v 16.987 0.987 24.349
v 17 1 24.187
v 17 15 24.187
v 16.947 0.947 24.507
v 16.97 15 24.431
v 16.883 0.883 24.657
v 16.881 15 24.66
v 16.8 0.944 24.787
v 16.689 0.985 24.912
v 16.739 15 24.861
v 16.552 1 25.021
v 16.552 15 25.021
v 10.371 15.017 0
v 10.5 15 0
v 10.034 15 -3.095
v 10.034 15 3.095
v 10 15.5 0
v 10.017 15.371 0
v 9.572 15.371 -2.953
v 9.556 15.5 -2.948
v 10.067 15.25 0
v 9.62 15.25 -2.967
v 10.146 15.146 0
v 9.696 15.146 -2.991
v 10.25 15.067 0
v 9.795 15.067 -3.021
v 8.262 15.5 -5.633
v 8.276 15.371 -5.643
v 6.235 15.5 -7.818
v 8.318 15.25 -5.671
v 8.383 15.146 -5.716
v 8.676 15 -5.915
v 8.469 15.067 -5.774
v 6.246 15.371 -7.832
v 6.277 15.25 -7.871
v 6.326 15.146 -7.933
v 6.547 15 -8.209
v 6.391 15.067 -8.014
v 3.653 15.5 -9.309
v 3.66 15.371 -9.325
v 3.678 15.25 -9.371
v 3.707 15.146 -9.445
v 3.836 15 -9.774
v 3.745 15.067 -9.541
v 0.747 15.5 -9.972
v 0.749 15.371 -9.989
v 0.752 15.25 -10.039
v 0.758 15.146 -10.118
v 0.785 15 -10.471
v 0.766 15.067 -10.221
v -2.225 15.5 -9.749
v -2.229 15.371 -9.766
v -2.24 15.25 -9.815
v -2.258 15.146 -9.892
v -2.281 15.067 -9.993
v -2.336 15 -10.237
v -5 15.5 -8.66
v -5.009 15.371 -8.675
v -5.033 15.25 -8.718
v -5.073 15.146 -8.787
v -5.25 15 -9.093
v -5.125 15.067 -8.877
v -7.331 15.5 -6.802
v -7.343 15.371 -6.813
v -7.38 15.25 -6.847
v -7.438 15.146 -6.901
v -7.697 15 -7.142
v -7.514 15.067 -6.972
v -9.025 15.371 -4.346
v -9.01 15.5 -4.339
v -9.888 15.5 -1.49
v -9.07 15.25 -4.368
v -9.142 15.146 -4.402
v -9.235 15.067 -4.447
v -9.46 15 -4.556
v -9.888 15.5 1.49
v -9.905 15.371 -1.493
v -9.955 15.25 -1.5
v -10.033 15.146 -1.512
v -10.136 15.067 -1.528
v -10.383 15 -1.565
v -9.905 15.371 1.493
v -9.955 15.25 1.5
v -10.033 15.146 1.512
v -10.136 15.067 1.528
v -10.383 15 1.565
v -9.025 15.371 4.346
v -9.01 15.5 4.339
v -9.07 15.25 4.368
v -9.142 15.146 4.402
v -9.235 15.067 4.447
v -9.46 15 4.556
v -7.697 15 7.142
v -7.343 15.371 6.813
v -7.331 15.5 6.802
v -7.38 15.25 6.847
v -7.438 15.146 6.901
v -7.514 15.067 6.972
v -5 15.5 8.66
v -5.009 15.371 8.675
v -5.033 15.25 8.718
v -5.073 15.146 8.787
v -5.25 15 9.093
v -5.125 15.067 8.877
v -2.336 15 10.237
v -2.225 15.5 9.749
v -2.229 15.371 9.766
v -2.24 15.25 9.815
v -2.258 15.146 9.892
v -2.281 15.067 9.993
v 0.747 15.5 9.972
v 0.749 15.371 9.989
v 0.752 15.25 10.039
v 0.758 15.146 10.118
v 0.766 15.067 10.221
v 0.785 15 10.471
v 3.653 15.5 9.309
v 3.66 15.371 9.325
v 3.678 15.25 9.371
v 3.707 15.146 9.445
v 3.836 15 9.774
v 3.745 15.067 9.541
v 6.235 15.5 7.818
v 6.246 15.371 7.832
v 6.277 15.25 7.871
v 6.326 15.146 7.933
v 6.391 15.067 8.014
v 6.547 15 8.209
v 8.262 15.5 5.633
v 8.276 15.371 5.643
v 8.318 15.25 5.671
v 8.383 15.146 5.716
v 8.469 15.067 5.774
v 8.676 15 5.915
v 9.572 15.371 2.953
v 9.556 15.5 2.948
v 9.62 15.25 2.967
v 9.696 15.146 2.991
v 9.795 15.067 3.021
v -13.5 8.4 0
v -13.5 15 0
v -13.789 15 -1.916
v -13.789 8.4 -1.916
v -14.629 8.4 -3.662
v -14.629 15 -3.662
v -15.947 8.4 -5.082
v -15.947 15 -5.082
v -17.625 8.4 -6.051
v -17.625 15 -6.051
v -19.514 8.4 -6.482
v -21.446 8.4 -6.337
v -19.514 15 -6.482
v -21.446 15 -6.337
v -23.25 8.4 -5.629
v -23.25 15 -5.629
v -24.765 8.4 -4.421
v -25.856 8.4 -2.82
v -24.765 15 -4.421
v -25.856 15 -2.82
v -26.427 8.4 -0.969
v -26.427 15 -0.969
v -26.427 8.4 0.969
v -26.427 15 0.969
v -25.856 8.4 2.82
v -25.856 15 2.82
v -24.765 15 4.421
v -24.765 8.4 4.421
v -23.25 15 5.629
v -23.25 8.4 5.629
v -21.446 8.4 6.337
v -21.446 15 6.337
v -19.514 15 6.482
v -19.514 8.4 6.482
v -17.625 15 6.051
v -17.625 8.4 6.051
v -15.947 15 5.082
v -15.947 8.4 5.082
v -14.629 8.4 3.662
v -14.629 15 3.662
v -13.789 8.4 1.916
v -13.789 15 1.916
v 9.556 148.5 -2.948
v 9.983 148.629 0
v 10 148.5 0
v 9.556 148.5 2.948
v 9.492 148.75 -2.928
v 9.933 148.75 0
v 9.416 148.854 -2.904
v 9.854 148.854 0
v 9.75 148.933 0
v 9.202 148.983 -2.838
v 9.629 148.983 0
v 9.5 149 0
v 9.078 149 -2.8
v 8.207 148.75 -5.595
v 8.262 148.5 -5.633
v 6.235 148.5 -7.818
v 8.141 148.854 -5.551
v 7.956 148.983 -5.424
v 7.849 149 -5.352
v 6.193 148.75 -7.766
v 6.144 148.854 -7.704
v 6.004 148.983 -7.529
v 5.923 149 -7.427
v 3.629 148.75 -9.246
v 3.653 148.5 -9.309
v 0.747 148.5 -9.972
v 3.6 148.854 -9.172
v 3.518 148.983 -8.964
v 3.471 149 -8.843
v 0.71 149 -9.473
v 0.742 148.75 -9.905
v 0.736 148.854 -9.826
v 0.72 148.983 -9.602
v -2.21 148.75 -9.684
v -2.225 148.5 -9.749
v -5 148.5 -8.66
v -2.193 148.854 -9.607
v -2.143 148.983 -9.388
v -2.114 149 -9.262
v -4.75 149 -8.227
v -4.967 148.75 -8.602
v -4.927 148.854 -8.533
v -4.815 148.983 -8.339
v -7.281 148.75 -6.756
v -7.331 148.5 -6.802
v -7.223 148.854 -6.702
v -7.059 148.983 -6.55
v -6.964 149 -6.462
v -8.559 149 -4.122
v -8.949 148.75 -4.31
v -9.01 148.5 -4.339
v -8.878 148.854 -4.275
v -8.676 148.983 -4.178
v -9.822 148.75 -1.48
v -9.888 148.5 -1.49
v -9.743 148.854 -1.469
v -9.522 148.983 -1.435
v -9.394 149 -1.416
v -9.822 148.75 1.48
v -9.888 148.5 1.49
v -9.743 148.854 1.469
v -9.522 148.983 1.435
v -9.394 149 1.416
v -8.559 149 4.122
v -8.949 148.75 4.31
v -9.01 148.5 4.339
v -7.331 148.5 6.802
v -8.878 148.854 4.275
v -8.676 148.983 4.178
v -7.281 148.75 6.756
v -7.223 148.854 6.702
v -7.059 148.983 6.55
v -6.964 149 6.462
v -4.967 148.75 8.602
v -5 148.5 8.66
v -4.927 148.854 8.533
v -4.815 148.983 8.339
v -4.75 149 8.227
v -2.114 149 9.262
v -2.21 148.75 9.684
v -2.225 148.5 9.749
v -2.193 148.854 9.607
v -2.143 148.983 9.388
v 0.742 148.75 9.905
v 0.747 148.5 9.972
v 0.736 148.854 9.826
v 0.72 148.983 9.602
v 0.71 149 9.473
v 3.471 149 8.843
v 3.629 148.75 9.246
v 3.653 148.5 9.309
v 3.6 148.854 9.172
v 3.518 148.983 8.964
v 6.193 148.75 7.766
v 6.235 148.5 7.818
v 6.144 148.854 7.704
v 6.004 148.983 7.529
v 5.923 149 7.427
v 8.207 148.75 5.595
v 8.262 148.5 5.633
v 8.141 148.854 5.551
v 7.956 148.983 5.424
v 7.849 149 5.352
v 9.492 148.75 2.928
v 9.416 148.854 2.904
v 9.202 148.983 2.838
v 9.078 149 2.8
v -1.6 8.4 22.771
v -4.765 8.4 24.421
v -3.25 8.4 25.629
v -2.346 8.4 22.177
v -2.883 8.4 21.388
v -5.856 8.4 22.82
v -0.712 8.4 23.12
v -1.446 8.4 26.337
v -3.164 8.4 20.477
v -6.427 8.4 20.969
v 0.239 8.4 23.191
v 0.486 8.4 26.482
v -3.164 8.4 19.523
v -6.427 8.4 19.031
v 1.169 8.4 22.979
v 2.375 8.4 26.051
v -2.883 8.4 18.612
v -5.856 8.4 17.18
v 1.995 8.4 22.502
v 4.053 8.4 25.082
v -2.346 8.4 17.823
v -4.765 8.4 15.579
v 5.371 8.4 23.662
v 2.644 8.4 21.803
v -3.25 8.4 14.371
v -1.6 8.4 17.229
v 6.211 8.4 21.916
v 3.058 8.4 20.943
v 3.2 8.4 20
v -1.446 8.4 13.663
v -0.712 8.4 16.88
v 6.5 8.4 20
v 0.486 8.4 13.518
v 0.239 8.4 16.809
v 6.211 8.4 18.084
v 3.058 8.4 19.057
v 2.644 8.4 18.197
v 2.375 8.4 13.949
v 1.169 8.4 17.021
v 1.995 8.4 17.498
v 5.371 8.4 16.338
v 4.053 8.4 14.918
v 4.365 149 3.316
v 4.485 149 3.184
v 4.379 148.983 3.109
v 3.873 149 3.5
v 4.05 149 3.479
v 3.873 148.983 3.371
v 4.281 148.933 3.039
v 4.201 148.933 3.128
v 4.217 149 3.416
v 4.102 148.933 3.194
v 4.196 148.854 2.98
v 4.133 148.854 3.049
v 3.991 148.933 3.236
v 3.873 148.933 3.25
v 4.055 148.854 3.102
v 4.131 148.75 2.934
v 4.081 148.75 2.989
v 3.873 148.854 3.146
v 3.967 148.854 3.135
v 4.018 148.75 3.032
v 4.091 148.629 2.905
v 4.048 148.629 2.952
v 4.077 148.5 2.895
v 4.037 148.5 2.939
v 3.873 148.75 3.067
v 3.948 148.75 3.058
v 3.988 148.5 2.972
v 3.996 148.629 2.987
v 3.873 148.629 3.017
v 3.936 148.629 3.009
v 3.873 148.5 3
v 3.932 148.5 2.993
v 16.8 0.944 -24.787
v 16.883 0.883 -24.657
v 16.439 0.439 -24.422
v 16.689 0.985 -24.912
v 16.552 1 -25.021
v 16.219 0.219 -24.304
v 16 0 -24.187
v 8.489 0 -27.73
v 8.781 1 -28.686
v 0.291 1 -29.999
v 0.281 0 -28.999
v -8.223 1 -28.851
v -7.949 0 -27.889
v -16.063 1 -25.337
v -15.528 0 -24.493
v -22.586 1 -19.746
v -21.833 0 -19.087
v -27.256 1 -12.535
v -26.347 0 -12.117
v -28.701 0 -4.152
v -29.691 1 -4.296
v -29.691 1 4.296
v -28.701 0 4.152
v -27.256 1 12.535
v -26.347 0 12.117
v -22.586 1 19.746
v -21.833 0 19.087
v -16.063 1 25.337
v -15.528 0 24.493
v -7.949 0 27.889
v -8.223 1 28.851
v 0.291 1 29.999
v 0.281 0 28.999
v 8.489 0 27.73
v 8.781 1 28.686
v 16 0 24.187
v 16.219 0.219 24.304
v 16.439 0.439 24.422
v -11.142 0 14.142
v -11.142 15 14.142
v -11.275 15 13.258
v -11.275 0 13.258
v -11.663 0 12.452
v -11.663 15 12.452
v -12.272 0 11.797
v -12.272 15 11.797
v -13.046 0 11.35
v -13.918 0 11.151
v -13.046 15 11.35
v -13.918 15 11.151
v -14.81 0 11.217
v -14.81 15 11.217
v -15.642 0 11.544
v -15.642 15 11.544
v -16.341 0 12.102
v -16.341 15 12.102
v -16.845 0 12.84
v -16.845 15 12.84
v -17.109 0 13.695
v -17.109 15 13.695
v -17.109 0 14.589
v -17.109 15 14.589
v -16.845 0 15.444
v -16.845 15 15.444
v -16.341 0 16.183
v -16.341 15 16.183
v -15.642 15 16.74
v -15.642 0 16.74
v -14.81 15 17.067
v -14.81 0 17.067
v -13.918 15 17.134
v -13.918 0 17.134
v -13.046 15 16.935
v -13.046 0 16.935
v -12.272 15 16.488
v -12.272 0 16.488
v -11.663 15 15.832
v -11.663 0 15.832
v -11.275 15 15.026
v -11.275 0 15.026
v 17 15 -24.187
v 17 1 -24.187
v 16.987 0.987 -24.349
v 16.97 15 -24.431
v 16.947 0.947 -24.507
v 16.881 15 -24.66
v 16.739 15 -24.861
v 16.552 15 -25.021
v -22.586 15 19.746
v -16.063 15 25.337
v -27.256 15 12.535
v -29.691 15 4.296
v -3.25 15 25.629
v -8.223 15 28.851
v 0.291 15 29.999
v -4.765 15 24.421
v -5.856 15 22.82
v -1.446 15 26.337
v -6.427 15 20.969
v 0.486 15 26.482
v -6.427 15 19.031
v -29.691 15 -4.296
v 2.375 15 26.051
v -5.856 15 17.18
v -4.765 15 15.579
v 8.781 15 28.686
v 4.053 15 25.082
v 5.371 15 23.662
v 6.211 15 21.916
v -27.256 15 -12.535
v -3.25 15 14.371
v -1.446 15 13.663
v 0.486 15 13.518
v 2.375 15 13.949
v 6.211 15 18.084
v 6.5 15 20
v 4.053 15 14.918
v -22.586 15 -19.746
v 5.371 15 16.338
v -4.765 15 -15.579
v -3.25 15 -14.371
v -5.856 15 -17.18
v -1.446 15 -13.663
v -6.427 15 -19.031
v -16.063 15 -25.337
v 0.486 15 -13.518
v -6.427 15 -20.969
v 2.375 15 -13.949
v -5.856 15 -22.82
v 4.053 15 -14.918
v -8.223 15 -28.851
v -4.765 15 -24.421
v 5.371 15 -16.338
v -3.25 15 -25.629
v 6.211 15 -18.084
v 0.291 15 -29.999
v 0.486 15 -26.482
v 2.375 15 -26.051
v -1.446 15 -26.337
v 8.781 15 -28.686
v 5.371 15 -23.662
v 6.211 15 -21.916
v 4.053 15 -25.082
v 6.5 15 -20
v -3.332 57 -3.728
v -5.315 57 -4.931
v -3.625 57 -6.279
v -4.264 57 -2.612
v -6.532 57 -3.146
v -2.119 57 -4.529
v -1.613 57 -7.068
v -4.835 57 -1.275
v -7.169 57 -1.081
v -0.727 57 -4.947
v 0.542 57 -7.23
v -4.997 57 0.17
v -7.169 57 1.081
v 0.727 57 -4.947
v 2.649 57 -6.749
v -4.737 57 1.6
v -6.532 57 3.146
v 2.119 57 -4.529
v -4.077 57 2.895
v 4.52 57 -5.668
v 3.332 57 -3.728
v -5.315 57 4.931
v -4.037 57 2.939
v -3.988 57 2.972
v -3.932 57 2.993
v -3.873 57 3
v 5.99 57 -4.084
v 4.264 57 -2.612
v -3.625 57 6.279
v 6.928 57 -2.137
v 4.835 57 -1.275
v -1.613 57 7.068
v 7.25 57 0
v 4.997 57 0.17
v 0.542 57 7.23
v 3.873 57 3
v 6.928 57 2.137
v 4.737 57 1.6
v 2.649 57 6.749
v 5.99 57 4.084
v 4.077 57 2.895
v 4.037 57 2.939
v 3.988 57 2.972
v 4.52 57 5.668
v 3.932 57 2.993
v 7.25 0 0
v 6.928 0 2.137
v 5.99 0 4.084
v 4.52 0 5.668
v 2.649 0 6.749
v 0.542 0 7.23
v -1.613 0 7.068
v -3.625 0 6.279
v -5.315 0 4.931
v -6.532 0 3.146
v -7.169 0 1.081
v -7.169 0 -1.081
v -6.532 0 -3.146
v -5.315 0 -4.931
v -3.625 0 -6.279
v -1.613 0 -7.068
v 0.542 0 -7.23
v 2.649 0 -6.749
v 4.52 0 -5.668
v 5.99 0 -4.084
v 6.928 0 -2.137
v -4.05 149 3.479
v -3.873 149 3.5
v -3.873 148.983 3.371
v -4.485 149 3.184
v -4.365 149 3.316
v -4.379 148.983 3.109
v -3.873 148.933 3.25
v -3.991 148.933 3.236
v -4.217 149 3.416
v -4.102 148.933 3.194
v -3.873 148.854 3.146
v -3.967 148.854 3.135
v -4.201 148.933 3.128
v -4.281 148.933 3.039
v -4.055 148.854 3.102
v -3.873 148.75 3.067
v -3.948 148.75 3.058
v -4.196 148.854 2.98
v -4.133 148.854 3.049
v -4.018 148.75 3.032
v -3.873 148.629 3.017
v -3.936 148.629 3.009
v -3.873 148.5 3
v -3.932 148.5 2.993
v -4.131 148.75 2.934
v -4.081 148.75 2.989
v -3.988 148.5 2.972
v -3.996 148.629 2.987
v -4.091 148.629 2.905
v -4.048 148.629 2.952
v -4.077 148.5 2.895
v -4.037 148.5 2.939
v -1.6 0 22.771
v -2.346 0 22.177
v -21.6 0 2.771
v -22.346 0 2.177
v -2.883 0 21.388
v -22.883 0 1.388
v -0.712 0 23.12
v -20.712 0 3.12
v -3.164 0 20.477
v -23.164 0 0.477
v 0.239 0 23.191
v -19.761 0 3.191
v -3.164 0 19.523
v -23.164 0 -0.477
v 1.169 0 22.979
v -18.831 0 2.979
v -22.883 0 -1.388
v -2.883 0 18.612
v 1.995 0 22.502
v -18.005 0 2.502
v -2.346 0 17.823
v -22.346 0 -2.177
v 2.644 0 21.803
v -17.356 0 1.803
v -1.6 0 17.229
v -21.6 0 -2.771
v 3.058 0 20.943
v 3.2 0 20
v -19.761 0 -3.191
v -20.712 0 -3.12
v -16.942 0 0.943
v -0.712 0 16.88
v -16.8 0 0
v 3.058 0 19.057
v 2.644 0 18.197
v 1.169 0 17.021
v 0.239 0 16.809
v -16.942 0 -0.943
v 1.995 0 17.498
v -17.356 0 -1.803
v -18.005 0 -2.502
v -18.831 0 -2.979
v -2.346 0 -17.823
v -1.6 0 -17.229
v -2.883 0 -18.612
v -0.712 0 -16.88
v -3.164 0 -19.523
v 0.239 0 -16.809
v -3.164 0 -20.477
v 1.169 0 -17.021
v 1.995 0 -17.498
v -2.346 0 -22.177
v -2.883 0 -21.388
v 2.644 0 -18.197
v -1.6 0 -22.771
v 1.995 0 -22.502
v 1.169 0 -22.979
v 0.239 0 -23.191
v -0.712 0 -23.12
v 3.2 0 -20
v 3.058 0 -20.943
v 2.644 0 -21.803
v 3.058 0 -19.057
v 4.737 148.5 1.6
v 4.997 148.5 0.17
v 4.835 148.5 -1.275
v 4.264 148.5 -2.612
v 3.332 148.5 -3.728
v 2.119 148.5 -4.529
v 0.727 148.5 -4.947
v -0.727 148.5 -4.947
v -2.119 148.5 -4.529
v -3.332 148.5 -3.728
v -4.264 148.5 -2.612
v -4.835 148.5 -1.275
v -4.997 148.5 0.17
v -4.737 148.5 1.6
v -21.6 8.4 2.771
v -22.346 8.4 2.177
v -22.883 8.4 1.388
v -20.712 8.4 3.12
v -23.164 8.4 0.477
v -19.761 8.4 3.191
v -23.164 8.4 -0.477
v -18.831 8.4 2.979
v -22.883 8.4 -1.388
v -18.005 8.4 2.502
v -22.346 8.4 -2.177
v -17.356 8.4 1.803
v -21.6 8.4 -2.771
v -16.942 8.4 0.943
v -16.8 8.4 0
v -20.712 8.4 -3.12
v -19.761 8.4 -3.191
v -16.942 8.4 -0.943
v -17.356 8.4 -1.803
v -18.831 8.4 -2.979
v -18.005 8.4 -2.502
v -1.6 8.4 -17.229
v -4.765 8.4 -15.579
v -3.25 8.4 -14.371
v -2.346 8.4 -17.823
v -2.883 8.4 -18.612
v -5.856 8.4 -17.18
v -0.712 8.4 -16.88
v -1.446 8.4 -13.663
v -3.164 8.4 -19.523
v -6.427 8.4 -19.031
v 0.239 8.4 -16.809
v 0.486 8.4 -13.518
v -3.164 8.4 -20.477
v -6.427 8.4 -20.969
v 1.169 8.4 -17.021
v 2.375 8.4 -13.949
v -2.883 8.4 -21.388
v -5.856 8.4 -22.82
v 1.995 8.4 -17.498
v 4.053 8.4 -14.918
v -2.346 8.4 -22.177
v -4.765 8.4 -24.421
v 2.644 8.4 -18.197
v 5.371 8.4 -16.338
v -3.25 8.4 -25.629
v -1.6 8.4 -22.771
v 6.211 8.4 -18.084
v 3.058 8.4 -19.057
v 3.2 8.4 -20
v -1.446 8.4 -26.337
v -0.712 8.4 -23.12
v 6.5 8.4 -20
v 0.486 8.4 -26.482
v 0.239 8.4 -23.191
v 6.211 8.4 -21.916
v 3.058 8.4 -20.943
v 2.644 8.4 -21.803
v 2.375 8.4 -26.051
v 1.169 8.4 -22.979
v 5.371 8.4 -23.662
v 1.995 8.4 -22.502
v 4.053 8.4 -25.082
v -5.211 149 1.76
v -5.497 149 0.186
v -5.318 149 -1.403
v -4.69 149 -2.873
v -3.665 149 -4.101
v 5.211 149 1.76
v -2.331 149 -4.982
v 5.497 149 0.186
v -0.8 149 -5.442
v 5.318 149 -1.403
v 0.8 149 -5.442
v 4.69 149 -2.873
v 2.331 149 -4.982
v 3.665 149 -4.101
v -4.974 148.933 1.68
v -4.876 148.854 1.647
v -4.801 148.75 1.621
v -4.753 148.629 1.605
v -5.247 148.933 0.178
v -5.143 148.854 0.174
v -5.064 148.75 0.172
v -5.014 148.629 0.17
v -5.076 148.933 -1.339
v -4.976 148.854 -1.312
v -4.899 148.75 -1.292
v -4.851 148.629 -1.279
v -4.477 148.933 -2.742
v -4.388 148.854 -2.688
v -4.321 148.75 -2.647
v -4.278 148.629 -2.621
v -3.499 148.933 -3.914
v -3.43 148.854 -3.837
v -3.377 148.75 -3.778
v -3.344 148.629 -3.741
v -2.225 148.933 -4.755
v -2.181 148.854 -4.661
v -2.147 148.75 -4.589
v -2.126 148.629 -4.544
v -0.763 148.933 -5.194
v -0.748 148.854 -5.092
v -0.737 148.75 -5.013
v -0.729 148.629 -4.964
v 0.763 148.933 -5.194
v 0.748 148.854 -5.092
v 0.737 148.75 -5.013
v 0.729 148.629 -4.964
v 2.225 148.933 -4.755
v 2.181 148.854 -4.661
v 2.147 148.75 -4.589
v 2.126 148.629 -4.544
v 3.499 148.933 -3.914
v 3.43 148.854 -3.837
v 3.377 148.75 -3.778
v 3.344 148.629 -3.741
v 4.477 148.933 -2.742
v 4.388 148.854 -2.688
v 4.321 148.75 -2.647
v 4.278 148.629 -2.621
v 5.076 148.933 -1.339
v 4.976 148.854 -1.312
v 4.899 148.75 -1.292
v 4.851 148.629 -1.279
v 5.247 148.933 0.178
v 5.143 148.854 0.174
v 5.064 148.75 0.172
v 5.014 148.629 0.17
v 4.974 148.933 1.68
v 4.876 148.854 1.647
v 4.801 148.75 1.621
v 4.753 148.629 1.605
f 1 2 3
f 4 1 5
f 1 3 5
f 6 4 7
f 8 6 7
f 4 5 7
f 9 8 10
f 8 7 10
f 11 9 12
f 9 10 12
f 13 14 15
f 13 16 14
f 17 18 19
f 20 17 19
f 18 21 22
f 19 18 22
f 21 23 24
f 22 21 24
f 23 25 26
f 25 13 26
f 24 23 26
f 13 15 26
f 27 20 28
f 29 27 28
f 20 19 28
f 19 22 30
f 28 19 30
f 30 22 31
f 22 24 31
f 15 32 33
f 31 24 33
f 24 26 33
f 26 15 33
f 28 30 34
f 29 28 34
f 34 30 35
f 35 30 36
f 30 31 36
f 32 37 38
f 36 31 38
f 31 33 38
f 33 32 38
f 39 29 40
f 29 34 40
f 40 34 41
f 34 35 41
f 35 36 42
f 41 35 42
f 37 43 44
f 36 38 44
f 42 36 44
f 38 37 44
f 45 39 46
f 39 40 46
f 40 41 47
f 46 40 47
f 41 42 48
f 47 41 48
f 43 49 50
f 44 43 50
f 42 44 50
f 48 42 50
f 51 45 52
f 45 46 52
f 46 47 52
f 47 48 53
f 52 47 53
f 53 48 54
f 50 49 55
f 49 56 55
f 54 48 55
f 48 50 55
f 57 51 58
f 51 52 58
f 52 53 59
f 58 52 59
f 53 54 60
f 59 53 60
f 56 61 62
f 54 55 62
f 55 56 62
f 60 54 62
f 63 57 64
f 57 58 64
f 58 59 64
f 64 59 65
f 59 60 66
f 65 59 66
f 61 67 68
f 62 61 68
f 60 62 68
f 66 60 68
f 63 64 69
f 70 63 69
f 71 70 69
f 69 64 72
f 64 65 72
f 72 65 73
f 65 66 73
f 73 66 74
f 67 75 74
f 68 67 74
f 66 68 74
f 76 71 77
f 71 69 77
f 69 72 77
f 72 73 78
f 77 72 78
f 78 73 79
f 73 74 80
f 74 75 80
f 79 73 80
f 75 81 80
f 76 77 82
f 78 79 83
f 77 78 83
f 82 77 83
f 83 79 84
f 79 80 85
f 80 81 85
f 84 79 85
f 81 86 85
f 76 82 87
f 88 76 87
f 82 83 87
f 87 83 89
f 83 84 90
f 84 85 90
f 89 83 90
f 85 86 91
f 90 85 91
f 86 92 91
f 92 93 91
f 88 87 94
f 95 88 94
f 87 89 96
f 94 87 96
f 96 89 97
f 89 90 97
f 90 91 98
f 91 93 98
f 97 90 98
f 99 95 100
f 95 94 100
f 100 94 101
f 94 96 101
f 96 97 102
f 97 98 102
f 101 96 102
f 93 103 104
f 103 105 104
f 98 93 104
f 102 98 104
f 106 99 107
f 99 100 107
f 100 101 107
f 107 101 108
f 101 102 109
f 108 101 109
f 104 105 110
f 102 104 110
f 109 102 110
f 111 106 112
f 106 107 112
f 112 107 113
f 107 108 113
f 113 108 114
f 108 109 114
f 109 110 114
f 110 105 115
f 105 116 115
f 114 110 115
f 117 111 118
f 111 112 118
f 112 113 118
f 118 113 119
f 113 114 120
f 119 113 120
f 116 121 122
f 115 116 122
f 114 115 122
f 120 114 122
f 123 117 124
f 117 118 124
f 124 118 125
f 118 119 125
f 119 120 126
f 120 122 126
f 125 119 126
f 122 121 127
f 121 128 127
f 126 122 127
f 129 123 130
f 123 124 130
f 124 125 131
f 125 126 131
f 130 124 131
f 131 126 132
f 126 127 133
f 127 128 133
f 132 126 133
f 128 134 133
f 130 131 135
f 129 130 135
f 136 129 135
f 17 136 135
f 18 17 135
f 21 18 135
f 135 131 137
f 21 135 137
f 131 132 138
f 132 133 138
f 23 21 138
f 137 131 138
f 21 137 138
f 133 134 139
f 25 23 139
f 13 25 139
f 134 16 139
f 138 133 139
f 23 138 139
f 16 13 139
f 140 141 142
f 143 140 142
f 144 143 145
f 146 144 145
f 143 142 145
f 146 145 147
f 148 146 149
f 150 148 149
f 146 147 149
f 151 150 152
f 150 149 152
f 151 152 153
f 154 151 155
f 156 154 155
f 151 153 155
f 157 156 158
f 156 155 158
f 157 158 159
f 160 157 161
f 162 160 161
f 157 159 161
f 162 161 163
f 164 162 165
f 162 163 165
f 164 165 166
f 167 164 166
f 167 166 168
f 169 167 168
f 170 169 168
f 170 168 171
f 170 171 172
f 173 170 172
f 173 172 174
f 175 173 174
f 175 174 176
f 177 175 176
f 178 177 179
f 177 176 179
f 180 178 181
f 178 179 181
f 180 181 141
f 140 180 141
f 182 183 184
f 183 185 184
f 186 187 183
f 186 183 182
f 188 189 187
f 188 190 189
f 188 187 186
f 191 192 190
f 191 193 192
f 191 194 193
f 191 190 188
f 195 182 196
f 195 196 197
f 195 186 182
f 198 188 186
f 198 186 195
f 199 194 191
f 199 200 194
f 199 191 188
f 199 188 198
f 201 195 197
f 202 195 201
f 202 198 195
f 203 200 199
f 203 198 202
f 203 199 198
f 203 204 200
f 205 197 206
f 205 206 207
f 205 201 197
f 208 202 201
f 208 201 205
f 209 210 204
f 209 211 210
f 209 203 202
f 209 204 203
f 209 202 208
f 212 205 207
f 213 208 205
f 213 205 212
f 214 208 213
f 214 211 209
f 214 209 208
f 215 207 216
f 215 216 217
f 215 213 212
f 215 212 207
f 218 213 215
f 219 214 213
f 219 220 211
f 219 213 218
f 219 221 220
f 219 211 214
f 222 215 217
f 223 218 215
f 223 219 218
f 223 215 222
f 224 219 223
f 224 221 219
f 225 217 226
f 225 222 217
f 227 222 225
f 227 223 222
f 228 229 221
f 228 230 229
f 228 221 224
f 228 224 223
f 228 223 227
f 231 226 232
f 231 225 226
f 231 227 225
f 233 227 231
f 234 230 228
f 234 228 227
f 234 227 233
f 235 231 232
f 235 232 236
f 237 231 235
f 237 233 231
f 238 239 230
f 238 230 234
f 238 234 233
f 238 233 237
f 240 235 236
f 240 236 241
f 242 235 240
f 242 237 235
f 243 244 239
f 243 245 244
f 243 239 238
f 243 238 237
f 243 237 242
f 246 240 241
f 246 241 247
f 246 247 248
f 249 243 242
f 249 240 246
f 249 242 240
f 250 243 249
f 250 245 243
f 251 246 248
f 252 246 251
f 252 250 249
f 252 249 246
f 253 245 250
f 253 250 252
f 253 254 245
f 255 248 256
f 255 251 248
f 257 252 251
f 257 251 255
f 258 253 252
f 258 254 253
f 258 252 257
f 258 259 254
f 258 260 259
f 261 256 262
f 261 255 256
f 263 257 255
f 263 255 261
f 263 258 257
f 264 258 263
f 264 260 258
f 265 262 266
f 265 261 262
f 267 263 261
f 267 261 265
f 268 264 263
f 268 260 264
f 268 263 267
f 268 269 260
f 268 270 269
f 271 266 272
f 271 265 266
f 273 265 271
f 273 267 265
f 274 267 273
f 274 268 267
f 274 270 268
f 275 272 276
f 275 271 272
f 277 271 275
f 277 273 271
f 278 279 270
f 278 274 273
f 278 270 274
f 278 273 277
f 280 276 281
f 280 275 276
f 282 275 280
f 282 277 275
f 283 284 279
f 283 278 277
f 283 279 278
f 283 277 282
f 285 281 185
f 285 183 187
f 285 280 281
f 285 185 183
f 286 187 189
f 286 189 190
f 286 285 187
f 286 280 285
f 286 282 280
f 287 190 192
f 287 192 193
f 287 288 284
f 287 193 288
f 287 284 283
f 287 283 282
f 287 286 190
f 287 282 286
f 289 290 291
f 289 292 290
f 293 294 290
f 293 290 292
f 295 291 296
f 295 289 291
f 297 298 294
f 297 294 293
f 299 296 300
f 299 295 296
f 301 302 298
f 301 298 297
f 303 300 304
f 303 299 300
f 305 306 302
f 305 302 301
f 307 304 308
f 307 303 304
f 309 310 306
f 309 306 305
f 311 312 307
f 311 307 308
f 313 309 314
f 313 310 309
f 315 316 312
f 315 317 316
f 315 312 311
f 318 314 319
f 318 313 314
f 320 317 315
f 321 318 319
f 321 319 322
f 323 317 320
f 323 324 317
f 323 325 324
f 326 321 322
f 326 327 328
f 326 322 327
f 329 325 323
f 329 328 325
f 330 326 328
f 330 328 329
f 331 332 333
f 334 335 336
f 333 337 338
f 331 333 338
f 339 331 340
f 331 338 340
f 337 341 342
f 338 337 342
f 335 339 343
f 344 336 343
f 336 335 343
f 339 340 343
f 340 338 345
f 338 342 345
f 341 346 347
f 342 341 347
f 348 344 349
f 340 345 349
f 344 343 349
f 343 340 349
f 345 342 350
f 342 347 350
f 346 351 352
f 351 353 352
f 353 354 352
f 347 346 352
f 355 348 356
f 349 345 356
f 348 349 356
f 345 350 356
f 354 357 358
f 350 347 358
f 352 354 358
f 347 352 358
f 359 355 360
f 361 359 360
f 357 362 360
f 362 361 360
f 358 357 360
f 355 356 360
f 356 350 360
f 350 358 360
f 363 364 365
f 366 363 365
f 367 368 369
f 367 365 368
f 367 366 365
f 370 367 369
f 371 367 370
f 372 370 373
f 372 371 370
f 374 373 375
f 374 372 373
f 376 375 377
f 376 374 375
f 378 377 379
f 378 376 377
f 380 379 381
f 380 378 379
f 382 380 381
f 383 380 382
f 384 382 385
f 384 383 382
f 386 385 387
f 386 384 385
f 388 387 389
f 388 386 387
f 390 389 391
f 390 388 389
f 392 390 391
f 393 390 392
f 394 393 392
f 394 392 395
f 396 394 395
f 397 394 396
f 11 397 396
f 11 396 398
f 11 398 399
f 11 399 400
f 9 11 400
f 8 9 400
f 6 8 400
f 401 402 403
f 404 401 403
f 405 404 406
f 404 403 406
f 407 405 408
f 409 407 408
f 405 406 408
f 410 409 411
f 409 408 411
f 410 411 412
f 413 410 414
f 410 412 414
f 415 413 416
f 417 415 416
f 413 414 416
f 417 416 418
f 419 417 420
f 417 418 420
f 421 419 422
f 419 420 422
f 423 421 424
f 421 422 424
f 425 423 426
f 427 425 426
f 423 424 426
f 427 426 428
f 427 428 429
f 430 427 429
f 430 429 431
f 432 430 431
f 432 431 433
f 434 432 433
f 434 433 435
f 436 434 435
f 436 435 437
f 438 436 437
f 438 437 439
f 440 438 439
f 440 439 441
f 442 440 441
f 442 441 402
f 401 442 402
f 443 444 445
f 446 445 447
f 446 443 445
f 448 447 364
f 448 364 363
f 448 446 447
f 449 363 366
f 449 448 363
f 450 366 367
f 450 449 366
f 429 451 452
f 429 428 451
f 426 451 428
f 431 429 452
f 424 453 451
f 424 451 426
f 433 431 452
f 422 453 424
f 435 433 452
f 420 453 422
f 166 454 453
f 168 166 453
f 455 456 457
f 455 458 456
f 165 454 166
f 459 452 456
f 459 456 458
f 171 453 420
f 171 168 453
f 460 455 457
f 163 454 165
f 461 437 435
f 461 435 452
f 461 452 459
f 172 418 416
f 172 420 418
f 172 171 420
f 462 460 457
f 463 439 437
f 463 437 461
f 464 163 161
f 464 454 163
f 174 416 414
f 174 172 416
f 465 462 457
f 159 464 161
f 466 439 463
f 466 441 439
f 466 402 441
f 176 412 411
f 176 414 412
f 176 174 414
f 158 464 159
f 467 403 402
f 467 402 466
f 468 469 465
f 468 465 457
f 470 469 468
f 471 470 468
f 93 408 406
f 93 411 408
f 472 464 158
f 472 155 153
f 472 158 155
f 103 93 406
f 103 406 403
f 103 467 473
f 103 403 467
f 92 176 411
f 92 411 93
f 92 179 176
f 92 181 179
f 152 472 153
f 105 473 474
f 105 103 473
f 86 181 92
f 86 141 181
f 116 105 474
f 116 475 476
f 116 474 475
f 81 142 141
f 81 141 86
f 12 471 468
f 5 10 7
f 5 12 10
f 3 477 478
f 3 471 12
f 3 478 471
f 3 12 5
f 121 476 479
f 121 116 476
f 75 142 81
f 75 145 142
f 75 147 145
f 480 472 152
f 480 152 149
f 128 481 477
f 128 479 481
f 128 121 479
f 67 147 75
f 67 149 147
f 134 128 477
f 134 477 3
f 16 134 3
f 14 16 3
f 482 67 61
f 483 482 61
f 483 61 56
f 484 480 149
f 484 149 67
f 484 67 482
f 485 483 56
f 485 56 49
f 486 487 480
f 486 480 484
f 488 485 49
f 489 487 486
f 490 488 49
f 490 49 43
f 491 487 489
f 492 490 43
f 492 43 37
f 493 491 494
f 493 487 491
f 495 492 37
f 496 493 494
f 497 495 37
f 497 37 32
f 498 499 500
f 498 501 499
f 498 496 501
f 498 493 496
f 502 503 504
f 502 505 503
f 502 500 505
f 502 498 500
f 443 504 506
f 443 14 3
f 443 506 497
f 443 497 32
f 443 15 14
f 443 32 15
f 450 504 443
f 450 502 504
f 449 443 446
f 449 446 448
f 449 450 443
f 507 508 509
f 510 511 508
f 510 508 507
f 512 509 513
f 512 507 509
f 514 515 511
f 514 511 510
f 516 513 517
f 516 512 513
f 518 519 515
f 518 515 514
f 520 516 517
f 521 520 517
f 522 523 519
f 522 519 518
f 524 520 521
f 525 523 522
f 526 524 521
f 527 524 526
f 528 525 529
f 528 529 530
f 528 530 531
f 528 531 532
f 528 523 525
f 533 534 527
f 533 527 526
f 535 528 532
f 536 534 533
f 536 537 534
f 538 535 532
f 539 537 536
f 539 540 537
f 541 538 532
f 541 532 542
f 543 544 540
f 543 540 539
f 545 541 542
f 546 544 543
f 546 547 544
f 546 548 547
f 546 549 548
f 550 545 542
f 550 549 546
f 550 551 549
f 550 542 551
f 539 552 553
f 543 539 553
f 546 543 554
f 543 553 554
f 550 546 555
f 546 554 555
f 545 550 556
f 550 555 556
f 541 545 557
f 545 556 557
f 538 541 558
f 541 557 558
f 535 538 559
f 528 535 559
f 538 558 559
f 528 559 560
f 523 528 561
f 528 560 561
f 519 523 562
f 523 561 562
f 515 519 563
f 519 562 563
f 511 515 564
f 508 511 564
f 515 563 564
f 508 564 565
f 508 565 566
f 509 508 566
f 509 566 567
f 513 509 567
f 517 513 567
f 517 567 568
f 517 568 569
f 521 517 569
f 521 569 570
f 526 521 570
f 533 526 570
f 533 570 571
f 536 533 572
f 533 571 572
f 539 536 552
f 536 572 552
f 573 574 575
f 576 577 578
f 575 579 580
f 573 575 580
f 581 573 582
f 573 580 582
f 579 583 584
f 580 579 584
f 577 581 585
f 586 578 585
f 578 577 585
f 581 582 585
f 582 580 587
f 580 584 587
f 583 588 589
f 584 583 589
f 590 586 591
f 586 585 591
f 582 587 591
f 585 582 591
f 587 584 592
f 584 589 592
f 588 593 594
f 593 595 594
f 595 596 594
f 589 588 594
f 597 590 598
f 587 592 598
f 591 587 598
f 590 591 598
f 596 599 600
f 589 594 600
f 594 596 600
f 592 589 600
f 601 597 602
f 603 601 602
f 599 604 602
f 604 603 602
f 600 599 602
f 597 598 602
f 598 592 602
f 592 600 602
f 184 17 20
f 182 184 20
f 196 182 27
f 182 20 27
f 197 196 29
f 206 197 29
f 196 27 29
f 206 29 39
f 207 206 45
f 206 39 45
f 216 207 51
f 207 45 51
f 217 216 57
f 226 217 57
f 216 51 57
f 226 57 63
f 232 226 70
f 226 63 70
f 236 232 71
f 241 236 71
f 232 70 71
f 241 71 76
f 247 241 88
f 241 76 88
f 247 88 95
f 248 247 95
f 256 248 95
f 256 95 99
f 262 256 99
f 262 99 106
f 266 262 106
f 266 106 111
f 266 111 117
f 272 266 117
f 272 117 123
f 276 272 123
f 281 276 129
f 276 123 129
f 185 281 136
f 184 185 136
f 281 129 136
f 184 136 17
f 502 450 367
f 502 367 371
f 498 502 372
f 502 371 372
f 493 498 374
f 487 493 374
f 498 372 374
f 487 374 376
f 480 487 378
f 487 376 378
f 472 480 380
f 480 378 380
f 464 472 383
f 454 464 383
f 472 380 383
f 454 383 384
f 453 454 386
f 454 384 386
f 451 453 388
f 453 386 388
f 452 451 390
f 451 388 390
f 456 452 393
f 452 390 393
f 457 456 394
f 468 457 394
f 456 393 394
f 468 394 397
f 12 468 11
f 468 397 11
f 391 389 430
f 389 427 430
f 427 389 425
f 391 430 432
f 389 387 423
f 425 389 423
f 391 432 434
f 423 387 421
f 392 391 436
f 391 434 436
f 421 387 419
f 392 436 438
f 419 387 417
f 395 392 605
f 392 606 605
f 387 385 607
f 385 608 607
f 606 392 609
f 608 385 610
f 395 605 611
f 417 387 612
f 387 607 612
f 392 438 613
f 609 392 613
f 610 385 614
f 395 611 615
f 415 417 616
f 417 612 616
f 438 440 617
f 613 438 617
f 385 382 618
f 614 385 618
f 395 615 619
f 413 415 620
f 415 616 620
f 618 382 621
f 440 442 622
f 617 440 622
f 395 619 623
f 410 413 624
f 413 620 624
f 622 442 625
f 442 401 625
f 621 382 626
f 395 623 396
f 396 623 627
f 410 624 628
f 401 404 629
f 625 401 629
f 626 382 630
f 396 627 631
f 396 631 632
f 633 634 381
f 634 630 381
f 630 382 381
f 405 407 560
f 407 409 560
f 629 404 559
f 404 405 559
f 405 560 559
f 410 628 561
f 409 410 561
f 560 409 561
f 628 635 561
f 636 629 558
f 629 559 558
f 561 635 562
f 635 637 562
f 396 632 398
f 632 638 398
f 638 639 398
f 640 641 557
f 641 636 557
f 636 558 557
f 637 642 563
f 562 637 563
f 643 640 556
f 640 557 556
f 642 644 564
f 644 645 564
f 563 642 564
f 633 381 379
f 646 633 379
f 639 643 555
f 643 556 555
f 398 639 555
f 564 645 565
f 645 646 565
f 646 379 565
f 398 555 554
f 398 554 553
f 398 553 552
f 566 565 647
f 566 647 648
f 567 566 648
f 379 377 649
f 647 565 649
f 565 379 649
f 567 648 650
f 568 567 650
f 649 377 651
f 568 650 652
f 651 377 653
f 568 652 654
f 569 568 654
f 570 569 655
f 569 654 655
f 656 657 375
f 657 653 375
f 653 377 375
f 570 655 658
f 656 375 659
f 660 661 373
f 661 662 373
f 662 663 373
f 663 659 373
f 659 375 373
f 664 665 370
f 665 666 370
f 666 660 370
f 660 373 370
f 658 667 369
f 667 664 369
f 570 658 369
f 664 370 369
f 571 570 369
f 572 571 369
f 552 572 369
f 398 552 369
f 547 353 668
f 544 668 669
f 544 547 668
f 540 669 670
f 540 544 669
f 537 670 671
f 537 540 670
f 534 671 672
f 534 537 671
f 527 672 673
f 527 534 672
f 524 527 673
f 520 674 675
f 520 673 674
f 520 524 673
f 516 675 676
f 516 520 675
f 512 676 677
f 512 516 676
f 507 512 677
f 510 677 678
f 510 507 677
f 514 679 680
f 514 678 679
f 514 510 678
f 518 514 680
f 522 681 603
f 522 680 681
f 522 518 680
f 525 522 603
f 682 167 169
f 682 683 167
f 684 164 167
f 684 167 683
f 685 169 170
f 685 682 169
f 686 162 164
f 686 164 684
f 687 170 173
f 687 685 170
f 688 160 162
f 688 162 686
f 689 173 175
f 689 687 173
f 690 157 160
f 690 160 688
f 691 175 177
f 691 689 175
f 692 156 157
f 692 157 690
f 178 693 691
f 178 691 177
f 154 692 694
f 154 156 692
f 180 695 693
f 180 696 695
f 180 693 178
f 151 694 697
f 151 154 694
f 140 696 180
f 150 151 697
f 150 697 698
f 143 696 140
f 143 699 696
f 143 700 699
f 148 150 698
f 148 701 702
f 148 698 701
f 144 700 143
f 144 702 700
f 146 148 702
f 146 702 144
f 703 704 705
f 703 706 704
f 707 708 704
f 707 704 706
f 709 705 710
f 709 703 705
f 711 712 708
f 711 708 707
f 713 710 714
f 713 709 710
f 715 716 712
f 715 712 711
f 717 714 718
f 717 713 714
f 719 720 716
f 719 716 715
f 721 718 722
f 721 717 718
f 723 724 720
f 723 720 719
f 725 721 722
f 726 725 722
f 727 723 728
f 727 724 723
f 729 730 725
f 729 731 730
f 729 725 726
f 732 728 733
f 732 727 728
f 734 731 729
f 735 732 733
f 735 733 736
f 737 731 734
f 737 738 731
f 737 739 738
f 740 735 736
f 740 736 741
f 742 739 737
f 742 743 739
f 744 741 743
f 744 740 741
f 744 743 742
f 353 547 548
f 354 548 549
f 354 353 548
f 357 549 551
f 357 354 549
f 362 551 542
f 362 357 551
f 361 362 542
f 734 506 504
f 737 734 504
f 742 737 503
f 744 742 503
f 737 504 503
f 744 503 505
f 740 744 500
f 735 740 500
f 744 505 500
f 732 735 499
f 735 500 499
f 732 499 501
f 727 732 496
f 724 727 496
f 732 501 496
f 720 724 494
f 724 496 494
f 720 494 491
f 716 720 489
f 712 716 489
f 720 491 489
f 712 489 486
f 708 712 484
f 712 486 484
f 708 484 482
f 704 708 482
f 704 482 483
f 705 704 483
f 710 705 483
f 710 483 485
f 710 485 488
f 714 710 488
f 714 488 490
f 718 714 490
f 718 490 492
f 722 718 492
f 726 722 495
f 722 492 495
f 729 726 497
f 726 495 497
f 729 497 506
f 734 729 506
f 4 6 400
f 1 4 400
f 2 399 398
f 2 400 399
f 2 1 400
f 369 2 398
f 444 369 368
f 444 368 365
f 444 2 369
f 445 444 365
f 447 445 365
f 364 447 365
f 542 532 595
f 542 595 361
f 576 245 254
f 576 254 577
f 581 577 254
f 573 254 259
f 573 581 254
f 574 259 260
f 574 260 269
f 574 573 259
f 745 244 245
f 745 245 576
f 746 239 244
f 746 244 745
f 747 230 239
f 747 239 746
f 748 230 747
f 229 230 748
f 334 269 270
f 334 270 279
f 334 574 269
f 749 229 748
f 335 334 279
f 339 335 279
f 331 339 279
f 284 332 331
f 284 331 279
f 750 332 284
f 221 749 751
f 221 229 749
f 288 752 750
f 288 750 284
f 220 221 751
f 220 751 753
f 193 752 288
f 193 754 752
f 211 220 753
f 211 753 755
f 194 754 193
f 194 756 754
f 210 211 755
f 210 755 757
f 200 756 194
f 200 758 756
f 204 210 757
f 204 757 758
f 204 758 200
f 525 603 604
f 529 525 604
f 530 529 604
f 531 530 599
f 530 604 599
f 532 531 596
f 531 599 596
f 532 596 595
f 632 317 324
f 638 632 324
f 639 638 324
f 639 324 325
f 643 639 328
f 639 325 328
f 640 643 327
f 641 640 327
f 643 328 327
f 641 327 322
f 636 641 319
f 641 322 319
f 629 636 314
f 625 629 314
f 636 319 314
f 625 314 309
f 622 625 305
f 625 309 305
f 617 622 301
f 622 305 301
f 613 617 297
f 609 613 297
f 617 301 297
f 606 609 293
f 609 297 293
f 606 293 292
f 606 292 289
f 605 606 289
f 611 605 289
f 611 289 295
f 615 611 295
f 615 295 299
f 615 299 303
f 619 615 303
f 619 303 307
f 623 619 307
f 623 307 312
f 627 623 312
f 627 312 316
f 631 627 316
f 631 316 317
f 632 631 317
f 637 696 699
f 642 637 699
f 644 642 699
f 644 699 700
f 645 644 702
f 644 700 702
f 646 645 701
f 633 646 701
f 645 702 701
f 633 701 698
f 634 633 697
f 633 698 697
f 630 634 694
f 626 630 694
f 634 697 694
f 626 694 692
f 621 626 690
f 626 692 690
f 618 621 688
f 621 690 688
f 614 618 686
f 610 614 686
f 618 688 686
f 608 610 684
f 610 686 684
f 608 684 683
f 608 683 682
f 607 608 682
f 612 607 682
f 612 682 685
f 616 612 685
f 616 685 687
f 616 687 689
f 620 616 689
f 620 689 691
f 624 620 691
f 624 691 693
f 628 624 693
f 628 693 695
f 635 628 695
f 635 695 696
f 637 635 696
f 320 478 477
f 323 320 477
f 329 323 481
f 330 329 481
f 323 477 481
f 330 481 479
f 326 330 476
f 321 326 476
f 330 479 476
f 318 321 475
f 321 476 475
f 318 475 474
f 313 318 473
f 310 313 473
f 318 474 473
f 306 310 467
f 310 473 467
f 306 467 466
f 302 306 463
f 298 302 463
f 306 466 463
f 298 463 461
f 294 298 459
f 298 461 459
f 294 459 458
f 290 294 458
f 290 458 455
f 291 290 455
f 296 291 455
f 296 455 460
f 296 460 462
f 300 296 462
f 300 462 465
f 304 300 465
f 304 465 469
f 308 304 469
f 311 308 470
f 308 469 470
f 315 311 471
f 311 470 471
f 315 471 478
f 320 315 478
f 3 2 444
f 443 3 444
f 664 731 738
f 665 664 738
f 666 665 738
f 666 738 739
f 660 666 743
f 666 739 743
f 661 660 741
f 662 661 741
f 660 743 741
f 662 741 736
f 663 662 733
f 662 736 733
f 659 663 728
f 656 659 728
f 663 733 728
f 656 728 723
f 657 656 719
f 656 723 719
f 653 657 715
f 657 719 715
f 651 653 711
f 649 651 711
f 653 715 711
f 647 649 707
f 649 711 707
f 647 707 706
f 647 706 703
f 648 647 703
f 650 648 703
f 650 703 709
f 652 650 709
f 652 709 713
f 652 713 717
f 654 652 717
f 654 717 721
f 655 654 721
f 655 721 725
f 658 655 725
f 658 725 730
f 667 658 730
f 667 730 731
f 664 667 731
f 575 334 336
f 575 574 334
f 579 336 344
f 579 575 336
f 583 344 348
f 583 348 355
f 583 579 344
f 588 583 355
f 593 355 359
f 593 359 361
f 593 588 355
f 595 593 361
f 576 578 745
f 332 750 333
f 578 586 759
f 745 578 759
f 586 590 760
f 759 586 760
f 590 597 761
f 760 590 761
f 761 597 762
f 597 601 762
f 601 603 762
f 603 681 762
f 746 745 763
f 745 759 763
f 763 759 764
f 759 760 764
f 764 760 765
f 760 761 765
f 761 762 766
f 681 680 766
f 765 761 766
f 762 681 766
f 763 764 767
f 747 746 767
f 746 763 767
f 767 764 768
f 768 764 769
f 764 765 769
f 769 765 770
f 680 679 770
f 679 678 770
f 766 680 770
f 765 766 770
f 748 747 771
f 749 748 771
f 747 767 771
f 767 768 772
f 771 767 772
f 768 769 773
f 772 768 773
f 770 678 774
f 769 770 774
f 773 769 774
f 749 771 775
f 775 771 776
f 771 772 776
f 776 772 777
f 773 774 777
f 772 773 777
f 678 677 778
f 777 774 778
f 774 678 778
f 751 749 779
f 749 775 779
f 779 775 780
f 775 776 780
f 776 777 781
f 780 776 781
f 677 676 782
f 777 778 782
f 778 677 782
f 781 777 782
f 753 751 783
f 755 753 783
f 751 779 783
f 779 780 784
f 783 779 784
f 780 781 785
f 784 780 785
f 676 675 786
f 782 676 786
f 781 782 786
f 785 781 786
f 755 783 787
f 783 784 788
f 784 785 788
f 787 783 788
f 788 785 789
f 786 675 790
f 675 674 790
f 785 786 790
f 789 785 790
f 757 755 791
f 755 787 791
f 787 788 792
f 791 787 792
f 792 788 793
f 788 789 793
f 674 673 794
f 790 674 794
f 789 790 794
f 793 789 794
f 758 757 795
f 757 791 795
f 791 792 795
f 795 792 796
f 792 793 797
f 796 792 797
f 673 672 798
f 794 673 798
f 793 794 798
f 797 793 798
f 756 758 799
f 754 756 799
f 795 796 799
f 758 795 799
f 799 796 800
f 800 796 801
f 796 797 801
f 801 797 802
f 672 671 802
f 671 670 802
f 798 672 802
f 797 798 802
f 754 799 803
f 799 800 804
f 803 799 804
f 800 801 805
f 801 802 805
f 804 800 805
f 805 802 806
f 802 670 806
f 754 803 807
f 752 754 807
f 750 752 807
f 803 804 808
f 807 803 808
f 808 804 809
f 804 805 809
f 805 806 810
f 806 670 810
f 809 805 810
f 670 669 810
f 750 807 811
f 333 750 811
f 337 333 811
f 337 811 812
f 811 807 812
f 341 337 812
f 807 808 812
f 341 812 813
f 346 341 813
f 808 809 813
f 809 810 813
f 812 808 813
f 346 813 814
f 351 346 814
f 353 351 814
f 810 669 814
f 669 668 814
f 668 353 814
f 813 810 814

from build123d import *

# Parameters (mm, degrees)
BOSS_EXTRUDE1_DEPTH = 15
SKETCH2_R           = 10
BOSS_EXTRUDE2_DEPTH = 134
SKETCH4_R           = 7.25
CUT_EXTRUDE1_DEPTH  = 57
CUT_EXTRUDE2_DEPTH  = 93
SKETCH7_R           = 6.5
CUT_EXTRUDE3_DEPTH  = 6.6
SKETCH8_R           = 3.2
CUT_EXTRUDE4_DEPTH  = 9.4
FILLET1_R           = 0.25
CHAMFER1_SIZE       = 1
FILLET2_R           = 0.5
FILLET3_R           = 0.5
FILLET4_R           = 0.5
SKETCH9_R           = 3
CUT_EXTRUDE5_DEPTH  = 16
FILLET5_R           = 1


with BuildPart() as part:
    # Sketch1 → Boss-Extrude1 (new body)
    with BuildSketch(Plane(origin=(0, 0, 0), x_dir=(1, 0, 0), z_dir=(0, 1, 0))):
        with BuildLine():
            Line((17, -24.718414189), (17, 24.718414189))
            ThreePointArc((17, 24.718414189), (-30, 0), (17, -24.718414189))
        make_face()
    extrude(amount=BOSS_EXTRUDE1_DEPTH)

    # Sketch2 → Boss-Extrude2 (add)
    with BuildSketch(Plane(origin=(0, 15, 0), x_dir=(1, 0, 0), z_dir=(0, 1, 0))):
        Circle(SKETCH2_R)
    extrude(amount=BOSS_EXTRUDE2_DEPTH)

    # Sketch4 → Cut-Extrude1 (cut)
    with BuildSketch(Plane.XZ):
        Circle(SKETCH4_R)
    extrude(amount=-CUT_EXTRUDE1_DEPTH, mode=Mode.SUBTRACT)

    # Sketch5 → Cut-Extrude2 (cut, through all)
    with BuildSketch(Plane.XZ.offset(-57)):
        with BuildLine():
            Line((-4, 3), (4, 3))
            ThreePointArc((4, 3), (0, -5), (-4, 3))
        make_face()
    extrude(amount=-CUT_EXTRUDE2_DEPTH, mode=Mode.SUBTRACT)

    # Sketch7 → Cut-Extrude3 (cut)
    with BuildSketch(Plane(origin=(0, 15, 0), x_dir=(1, 0, 0), z_dir=(0, 1, 0))):
        with Locations((0, -20)):
            Circle(SKETCH7_R)
        with Locations((-20, 0)):
            Circle(SKETCH7_R)
        with Locations((0, 20)):
            Circle(SKETCH7_R)
    extrude(amount=-CUT_EXTRUDE3_DEPTH, mode=Mode.SUBTRACT)

    # Sketch8 → Cut-Extrude4 (cut, through all)
    with BuildSketch(Plane(origin=(0, 8.4, 0), x_dir=(1, 0, 0), z_dir=(0, 1, 0))):
        with Locations((0, -20)):
            Circle(SKETCH8_R)
        with Locations((-20, 0)):
            Circle(SKETCH8_R)
        with Locations((0, 20)):
            Circle(SKETCH8_R)
    extrude(amount=-CUT_EXTRUDE4_DEPTH, mode=Mode.SUBTRACT)

    # Fillet1
    fillet1_edges = [part.edges().sort_by_distance(p)[0] for p in [
        (4, 103, 3),
        (-4, 103, 3),
    ]]
    fillet(fillet1_edges, radius=FILLET1_R)

    # Chamfer1
    chamfer1_edges = [part.edges().sort_by_distance(p)[0] for p in [
        (17, 0, 0),
        (-30, 0, 0),
    ]]
    chamfer(chamfer1_edges, length=CHAMFER1_SIZE)

    # Fillet2
    fillet2_edges = [part.edges().sort_by_distance(p)[0] for p in [
        (-10, 149, 0),
    ]]
    fillet(fillet2_edges, radius=FILLET2_R)

    # Fillet3
    fillet3_edges = [part.edges().sort_by_distance(p)[0] for p in [
        (0, 149, 3),
        (0, 149, -5),
        (3.987691213, 149, 2.972130829),
        (-3.987691213, 149, 2.972130829),
    ]]
    fillet(fillet3_edges, radius=FILLET3_R)

    # Fillet4
    fillet4_edges = [part.edges().sort_by_distance(p)[0] for p in [
        (-10, 15, 0),
    ]]
    fillet(fillet4_edges, radius=FILLET4_R)

    # Sketch9 → Cut-Extrude5 (cut, through all)
    with BuildSketch(Plane(origin=(0, 15, 0), x_dir=(1, 0, 0), z_dir=(0, 1, 0))):
        with Locations((-14.142135624, -14.142135624)):
            Circle(SKETCH9_R)
    extrude(amount=-CUT_EXTRUDE5_DEPTH, mode=Mode.SUBTRACT)

    # Fillet5
    fillet5_edges = [part.edges().sort_by_distance(p)[0] for p in [
        (17, 8, -24.718414189),
        (17, 8, 24.718414189),
    ]]
    fillet(fillet5_edges, radius=FILLET5_R)


solid = part.part
